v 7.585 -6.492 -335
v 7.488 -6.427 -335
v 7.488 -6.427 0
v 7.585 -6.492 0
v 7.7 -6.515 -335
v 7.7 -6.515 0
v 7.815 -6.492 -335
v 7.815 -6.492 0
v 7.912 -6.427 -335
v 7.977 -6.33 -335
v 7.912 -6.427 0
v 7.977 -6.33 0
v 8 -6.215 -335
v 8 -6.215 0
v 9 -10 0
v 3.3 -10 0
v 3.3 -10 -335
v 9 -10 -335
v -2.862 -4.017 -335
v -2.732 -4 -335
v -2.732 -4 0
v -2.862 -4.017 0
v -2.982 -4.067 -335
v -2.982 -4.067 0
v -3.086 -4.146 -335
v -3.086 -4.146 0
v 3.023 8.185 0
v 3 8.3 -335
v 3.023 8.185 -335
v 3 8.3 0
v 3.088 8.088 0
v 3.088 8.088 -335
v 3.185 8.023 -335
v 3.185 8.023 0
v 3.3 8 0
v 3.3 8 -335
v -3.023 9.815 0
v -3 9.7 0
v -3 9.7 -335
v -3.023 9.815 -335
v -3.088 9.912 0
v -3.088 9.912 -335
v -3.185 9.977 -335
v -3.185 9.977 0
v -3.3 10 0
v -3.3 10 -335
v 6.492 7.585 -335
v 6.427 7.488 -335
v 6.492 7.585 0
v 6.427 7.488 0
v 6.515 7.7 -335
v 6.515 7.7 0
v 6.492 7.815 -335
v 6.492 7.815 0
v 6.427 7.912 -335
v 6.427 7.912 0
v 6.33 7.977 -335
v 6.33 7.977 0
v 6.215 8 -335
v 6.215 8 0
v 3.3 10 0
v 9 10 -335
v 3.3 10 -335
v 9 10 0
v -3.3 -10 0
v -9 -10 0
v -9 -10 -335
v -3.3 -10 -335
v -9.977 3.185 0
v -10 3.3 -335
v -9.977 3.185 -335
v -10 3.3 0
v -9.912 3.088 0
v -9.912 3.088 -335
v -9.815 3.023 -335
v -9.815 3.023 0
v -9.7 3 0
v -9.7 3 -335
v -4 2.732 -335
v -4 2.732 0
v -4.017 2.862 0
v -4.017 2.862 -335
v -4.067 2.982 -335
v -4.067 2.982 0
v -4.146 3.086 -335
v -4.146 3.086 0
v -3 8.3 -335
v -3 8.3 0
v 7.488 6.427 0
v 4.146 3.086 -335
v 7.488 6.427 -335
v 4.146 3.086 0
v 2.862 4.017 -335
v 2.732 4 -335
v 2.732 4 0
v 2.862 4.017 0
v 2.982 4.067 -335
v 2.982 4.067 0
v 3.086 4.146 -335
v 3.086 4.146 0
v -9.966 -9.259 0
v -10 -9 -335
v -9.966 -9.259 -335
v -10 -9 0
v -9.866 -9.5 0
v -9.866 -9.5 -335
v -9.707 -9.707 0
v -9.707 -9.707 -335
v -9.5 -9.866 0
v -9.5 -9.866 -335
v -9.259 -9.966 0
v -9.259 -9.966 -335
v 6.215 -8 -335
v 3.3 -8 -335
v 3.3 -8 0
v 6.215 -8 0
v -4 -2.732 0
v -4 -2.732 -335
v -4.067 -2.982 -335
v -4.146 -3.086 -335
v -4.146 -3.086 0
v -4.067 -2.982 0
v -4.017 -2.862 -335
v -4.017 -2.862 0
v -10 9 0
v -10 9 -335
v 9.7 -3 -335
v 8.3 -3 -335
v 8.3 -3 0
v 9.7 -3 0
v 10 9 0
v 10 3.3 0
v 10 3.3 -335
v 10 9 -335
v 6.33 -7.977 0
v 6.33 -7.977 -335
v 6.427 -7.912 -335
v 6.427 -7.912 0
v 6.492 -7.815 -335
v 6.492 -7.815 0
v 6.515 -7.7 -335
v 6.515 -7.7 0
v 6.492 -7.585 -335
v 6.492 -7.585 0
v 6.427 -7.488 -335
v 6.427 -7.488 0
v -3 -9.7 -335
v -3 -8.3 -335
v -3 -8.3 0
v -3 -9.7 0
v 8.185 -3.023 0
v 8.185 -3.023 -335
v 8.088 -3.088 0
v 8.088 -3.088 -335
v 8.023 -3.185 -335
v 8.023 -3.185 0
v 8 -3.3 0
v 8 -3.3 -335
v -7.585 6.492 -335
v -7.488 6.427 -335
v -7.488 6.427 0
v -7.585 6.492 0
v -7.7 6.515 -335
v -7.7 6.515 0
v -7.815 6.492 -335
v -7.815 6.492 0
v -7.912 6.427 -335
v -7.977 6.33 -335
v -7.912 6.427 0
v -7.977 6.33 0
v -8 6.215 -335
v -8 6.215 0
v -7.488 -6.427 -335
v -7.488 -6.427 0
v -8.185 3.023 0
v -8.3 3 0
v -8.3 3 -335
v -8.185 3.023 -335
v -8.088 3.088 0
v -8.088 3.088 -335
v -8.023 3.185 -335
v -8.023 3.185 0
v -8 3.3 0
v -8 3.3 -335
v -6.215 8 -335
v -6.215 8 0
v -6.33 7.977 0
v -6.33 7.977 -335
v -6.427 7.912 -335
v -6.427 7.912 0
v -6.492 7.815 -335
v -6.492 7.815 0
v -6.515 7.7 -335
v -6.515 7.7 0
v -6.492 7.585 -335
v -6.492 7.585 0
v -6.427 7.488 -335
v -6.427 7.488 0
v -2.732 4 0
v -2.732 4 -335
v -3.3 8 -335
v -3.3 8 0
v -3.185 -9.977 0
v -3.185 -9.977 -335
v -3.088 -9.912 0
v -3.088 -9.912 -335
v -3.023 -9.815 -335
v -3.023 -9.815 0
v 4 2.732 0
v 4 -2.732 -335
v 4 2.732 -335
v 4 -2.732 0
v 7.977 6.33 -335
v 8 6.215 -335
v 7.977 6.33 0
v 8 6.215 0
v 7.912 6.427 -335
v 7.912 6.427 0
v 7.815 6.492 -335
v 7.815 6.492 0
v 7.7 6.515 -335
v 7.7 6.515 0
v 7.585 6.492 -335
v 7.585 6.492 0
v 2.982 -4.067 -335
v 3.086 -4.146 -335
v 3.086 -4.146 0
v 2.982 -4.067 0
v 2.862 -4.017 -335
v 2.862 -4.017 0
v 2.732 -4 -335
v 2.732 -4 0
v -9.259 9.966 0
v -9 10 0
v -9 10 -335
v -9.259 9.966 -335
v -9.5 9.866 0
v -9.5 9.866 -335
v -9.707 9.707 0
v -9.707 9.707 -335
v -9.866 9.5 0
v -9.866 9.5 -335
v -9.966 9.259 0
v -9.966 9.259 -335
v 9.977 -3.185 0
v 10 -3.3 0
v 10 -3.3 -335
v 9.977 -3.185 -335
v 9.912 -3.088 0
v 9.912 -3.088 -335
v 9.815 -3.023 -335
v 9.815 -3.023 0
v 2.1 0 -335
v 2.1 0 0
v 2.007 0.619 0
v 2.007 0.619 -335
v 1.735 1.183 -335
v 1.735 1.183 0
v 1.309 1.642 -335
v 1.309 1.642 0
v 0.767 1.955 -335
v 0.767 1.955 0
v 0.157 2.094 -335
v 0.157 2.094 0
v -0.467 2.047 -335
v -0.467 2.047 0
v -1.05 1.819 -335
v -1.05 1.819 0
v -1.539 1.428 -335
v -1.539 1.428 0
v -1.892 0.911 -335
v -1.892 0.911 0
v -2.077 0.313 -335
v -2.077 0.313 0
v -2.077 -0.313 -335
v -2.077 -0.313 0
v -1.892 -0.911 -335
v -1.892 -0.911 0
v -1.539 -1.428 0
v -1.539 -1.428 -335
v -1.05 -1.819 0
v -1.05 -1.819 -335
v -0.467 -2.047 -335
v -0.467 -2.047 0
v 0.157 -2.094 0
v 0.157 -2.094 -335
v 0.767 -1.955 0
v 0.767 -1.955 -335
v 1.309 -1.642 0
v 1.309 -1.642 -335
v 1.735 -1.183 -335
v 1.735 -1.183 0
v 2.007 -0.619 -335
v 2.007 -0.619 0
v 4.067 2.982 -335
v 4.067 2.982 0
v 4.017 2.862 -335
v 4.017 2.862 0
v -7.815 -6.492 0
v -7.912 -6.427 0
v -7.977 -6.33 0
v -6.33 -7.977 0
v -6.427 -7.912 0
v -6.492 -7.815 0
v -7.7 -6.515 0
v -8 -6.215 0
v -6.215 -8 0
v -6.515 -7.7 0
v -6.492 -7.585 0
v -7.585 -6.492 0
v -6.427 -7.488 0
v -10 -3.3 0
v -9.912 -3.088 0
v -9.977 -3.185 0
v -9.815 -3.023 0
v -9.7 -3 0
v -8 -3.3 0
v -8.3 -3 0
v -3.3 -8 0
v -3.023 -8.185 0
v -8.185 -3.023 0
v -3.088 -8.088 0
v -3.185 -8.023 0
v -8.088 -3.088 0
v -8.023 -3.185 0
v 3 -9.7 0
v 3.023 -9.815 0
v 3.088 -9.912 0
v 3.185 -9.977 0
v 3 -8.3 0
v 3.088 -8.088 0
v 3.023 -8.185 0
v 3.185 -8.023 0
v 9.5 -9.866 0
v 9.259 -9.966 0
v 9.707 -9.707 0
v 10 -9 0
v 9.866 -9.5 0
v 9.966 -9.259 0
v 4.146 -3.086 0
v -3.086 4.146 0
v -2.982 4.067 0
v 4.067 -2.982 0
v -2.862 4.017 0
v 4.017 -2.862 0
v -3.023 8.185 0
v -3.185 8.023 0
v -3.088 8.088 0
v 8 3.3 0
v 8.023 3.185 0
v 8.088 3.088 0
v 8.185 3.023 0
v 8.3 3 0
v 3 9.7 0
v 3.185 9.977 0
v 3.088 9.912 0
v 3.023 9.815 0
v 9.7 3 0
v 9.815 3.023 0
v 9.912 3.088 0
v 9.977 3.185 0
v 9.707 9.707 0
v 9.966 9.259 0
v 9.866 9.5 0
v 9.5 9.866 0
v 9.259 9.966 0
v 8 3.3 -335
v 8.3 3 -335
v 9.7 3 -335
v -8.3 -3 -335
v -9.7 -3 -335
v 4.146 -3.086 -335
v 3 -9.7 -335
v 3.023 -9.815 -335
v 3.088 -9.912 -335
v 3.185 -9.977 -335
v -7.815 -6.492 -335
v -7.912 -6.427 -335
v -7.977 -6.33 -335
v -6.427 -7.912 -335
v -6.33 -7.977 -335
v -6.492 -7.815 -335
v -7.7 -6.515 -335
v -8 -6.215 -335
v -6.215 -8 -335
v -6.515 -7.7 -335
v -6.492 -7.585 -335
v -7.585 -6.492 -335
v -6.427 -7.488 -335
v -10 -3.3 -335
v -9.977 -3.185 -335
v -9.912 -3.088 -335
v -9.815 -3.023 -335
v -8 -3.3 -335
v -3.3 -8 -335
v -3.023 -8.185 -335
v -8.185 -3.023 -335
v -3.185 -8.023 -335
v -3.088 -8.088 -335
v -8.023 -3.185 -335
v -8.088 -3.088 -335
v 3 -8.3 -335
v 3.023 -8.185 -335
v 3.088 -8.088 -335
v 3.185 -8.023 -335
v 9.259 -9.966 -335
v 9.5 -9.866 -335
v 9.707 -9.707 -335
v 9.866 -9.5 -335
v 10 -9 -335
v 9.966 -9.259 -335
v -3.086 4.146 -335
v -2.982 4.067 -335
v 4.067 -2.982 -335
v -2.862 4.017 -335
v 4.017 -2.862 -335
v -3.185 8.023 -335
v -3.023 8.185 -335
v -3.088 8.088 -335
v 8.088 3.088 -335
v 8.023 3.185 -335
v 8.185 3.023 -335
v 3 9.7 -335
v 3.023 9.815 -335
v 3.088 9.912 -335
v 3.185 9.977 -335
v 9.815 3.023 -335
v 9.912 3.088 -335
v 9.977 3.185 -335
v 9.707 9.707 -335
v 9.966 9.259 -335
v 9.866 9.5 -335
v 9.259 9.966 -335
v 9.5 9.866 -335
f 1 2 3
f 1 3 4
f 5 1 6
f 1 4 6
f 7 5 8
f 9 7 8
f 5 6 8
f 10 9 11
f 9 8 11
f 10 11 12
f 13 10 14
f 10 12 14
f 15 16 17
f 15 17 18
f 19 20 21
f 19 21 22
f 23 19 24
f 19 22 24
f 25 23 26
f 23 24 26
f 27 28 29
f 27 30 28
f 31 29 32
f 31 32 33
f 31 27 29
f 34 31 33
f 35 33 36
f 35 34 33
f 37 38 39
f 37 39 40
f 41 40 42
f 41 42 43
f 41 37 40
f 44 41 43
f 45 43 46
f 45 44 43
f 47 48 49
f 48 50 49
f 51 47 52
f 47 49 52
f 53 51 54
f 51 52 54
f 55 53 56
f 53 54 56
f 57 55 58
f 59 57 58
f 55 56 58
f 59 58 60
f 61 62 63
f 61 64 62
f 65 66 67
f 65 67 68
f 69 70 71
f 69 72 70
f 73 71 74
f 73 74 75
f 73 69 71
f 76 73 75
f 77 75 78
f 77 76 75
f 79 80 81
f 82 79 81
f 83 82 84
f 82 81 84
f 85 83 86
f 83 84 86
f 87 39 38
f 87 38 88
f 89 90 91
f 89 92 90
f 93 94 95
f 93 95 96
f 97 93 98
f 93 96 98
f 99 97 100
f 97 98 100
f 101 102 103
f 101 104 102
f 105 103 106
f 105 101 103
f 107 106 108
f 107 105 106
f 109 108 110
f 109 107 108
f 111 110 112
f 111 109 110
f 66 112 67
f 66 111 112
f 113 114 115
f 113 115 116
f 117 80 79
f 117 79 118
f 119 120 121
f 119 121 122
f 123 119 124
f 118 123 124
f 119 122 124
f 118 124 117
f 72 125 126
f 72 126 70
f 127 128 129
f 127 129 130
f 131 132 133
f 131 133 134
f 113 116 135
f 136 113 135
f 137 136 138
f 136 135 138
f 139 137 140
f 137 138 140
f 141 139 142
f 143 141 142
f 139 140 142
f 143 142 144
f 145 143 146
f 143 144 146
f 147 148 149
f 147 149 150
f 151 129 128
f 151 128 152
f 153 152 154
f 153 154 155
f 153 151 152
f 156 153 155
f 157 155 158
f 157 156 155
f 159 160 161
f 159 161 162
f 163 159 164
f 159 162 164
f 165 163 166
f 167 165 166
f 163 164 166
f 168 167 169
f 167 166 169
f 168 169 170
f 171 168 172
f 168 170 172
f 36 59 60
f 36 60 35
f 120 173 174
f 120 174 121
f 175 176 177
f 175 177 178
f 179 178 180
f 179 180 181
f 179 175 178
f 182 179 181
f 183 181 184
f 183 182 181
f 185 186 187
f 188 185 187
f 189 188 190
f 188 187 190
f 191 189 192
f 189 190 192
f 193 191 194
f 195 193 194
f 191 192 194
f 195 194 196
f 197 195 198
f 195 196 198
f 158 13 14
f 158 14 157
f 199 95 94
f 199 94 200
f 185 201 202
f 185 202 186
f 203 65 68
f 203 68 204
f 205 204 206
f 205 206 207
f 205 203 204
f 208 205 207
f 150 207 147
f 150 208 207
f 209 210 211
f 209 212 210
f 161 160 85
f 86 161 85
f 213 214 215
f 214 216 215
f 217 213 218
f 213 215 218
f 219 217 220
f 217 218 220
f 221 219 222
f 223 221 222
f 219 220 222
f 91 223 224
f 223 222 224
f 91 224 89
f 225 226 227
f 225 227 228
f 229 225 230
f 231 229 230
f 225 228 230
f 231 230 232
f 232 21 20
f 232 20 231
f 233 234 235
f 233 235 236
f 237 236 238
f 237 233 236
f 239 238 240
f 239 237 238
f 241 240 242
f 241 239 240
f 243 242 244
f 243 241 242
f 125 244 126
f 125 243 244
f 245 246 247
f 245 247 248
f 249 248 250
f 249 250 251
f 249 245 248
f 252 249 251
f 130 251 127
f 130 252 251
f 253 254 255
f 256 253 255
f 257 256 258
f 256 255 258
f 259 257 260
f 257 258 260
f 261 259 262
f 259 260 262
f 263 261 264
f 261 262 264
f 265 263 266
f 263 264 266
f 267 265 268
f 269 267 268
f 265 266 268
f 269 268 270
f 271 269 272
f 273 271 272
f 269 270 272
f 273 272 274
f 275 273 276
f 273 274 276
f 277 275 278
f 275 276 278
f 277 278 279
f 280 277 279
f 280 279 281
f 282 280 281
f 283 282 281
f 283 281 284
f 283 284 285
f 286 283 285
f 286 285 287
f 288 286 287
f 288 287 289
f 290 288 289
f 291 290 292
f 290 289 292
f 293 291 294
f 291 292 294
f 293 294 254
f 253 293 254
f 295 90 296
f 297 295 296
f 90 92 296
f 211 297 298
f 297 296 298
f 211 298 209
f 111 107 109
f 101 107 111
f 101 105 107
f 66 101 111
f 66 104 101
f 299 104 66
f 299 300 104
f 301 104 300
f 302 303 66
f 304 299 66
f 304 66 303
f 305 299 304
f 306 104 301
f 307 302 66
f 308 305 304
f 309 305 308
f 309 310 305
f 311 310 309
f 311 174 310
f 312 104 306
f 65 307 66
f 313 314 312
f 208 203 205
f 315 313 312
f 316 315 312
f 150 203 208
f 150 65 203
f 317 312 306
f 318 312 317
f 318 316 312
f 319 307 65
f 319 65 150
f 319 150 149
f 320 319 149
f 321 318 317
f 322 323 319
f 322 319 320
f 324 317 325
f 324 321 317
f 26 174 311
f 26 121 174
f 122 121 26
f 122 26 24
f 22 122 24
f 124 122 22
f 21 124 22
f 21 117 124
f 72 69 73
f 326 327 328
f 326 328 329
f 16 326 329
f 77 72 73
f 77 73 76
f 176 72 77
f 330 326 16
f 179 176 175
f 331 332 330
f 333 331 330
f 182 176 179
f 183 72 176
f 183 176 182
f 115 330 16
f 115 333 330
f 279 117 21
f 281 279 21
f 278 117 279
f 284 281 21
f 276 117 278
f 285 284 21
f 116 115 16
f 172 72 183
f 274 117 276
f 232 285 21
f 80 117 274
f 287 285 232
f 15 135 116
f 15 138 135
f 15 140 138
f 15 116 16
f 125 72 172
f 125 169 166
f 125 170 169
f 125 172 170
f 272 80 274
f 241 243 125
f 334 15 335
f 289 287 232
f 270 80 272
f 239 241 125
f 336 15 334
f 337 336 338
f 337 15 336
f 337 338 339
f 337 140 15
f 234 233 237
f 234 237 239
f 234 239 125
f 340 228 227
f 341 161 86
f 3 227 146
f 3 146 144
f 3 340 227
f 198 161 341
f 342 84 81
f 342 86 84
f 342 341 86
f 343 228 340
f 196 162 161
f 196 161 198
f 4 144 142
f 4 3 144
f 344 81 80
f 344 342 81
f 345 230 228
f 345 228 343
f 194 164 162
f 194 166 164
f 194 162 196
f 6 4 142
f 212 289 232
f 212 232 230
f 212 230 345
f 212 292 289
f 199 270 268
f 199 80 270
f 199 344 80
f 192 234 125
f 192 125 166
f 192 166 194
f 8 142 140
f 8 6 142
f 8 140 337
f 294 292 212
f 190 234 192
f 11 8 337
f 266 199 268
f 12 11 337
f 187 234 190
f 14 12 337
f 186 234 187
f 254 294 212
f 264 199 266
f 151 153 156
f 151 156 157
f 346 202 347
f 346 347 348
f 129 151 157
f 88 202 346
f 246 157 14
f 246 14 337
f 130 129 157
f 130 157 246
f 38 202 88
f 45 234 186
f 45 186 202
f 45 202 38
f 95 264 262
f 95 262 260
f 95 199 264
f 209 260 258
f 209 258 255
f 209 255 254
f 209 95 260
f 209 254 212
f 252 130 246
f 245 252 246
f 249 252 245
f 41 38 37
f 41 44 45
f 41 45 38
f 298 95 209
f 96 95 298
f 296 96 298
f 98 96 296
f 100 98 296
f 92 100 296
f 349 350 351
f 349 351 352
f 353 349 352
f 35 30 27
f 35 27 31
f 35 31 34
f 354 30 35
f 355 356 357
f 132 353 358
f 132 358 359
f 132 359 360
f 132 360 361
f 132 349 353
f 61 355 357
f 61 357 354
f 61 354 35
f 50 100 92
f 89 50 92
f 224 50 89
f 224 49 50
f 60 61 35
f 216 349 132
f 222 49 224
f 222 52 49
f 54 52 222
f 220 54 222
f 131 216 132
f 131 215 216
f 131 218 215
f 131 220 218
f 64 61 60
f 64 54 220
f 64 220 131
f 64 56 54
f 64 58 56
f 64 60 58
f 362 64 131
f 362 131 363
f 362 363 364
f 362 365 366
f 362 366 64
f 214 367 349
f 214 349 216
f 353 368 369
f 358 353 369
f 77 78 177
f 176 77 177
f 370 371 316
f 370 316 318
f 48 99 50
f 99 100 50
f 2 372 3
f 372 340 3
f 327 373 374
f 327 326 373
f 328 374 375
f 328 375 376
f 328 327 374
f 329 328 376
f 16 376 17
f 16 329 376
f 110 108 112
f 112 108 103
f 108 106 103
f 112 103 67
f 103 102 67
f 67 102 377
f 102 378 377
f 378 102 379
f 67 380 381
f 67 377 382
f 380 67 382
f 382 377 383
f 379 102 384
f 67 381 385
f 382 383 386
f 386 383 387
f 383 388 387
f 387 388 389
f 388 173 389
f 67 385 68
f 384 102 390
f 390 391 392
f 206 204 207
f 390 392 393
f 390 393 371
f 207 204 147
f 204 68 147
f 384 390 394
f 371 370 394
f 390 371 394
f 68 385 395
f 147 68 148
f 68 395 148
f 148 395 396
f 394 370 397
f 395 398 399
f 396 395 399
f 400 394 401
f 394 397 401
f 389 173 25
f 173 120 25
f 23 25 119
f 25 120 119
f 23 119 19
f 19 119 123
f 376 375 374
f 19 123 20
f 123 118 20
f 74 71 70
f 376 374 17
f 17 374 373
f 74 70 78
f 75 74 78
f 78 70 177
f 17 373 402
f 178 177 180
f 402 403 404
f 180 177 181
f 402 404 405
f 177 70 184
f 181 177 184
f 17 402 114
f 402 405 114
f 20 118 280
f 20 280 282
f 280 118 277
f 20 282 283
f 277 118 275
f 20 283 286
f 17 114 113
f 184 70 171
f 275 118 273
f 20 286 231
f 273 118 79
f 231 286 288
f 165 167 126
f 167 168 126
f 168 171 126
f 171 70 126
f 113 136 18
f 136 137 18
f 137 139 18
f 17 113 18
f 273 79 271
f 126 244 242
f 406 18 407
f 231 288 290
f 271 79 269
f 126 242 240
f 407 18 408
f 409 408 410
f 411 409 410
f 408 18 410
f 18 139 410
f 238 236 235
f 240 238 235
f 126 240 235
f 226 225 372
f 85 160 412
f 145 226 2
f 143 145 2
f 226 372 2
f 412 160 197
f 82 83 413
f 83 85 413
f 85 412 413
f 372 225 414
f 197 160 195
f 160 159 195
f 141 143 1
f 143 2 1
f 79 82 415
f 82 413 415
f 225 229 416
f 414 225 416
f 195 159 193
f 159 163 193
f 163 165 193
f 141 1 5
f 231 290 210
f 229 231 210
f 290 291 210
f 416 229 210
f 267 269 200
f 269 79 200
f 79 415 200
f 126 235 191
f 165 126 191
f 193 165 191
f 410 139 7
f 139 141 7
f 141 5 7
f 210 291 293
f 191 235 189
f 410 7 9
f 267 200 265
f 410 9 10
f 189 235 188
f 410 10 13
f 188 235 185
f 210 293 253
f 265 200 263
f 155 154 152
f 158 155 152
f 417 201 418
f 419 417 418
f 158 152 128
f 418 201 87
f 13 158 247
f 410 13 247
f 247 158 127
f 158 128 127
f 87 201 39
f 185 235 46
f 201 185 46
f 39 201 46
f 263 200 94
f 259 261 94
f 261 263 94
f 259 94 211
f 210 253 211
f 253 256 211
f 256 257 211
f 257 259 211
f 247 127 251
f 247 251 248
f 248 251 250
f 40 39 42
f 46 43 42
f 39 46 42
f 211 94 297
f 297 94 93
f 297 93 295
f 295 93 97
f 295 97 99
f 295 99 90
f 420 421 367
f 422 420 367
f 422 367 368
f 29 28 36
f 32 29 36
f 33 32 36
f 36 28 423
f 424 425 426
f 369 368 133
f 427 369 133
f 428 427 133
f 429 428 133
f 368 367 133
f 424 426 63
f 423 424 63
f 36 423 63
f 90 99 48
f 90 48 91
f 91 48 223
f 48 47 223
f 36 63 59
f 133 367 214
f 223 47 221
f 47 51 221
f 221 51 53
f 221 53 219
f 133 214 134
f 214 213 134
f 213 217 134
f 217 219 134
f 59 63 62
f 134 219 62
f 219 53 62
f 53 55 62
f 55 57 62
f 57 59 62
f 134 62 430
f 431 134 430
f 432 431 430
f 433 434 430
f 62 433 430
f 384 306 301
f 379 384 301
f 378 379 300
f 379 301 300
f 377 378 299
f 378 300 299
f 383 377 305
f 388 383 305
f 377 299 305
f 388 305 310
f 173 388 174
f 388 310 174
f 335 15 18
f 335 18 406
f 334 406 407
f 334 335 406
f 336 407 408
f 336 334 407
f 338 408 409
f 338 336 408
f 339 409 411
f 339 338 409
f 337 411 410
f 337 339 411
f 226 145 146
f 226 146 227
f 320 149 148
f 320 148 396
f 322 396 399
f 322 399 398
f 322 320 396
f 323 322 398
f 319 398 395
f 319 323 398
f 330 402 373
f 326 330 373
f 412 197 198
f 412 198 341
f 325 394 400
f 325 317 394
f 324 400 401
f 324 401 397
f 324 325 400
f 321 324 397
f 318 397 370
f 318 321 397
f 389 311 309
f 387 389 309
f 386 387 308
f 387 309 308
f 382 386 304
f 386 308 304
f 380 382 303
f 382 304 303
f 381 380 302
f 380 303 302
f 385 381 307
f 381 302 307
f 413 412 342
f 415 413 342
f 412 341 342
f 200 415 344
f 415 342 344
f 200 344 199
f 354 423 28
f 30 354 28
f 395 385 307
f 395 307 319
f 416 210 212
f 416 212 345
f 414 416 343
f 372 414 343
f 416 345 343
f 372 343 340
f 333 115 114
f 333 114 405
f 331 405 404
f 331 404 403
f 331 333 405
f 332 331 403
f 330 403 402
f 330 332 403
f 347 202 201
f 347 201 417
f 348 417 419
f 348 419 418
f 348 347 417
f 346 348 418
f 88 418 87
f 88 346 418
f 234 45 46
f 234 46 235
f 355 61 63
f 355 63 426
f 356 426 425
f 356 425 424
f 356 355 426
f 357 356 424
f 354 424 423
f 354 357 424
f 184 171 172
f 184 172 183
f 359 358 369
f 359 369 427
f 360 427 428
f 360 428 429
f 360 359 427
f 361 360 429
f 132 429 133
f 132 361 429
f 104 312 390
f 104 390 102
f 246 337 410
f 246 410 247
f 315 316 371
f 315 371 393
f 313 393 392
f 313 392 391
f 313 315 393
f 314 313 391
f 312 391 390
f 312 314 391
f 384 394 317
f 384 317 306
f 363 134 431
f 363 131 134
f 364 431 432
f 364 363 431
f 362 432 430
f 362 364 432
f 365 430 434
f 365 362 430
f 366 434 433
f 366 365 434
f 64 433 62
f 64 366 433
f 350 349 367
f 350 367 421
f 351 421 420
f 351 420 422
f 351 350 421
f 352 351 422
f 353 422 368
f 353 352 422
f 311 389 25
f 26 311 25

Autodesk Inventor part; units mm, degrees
ref_plane "YZ Plane" through (0, 0, 0) normal (1, 0, 0) x (0, 1, 0)
ref_plane "XZ Plane" through (0, 0, 0) normal (0, 1, 0) x (-1, 0, 0)
ref_plane "XY Plane" through (0, 0, 0) normal (0, 0, 1) x (1, 0, 0)
sketch "Skizze1" plane through (0, 0, 0) normal (0, 0, 1) x (1, 0, 0)
  line L0 (-20.0059, 0) -> (20.0059, 0) projected
  line L1 (0, -20.0059) -> (0, 20.0059) projected
  line L2 (-14.2899, 0) -> (14.2899, 0)
  line L3 (0, -14.2899) -> (0, 14.2899)
  line L4 (-10, -10) -> (10, 10) construction
  line L5 (10, -10) -> (-10, 10) construction
  line L6 (-8, -8) -> (8, 8) construction
  line L7 (8, -8) -> (-8, 8) construction
  line L8 (-2.7322, -4) -> (2.7322, -4)
  line L9 (4, -2.7322) -> (4, 2.7322)
  line L10 (2.7322, 4) -> (-2.7322, 4)
  line L11 (-4, 2.7322) -> (-4, -2.7322)
  line L12 (-4, -4) -> (4, 4) construction
  line L13 (4, -4) -> (-4, 4) construction
  arc A0 (-9, 10) -> (-10, 9) centre (-9, 9) ccw
  arc A1 (10, 9) -> (9, 10) centre (9, 9) ccw
  arc A2 (9, -10) -> (10, -9) centre (9, -9) ccw
  arc A3 (-10, -9) -> (-9, -10) centre (-9, -9) ccw
  line L14 (-3, 9.7) -> (-3, 8.3)
  line L15 (3, 9.7) -> (3, 8.3)
  line L16 (6.2151, 8) -> (3.3, 8)
  line L17 (-3.3, 8) -> (-6.2151, 8)
  line L18 (9, 10) -> (3.3, 10)
  line L19 (-3.3, 10) -> (-9, 10)
  line L20 (-9.7, -3) -> (-8.3, -3)
  line L21 (-9.7, 3) -> (-8.3, 3)
  line L22 (-8, 6.2151) -> (-8, 3.3)
  line L23 (-8, -3.3) -> (-8, -6.2151)
  line L24 (-10, 9) -> (-10, 3.3)
  line L25 (-10, -3.3) -> (-10, -9)
  line L26 (-3, -8.3) -> (-3, -9.7)
  line L27 (3, -8.3) -> (3, -9.7)
  line L28 (-9, -10) -> (-3.3, -10)
  line L29 (3.3, -10) -> (9, -10)
  line L30 (-6.2151, -8) -> (-3.3, -8)
  line L31 (3.3, -8) -> (6.2151, -8)
  line L32 (8.3, 3) -> (9.7, 3)
  line L33 (8.3, -3) -> (9.7, -3)
  line L34 (8, -6.2151) -> (8, -3.3)
  line L35 (8, 3.3) -> (8, 6.2151)
  line L36 (10, -9) -> (10, -3.3)
  line L37 (10, 3.3) -> (10, 9)
  arc A4 (-10, 3.3) -> (-9.7, 3) centre (-9.7, 3.3) ccw
  arc A5 (-8.3, 3) -> (-8, 3.3) centre (-8.3, 3.3) ccw
  arc A6 (-9.7, -3) -> (-10, -3.3) centre (-9.7, -3.3) ccw
  arc A7 (-8, -3.3) -> (-8.3, -3) centre (-8.3, -3.3) ccw
  arc A8 (-3.3, -10) -> (-3, -9.7) centre (-3.3, -9.7) ccw
  arc A9 (-3, -8.3) -> (-3.3, -8) centre (-3.3, -8.3) ccw
  arc A10 (3, -9.7) -> (3.3, -10) centre (3.3, -9.7) ccw
  arc A11 (3.3, -8) -> (3, -8.3) centre (3.3, -8.3) ccw
  arc A12 (8.3, -3) -> (8, -3.3) centre (8.3, -3.3) ccw
  arc A13 (10, -3.3) -> (9.7, -3) centre (9.7, -3.3) ccw
  arc A14 (8, 3.3) -> (8.3, 3) centre (8.3, 3.3) ccw
  arc A15 (9.7, 3) -> (10, 3.3) centre (9.7, 3.3) ccw
  arc A16 (3, 8.3) -> (3.3, 8) centre (3.3, 8.3) ccw
  arc A17 (3.3, 10) -> (3, 9.7) centre (3.3, 9.7) ccw
  arc A18 (-3.3, 8) -> (-3, 8.3) centre (-3.3, 8.3) ccw
  arc A19 (-3, 9.7) -> (-3.3, 10) centre (-3.3, 9.7) ccw
  line L38 (-7.4879, 6.4272) -> (-4.1464, 3.0858)
  line L39 (-6.4272, 7.4879) -> (-3.0858, 4.1464)
  line L40 (-6.4272, -7.4879) -> (-3.0858, -4.1464)
  line L41 (-7.4879, -6.4272) -> (-4.1464, -3.0858)
  arc A20 (-7.4879, 6.4272) -> (-8, 6.2151) centre (-7.7, 6.2151) ccw
  arc A21 (-6.2151, 8) -> (-6.4272, 7.4879) centre (-6.2151, 7.7) ccw
  arc A22 (-8, -6.2151) -> (-7.4879, -6.4272) centre (-7.7, -6.2151) ccw
  arc A23 (-6.4272, -7.4879) -> (-6.2151, -8) centre (-6.2151, -7.7) ccw
  line L42 (6.4272, -7.4879) -> (3.0858, -4.1464)
  line L43 (4.1464, -3.0858) -> (7.4879, -6.4272)
  arc A24 (6.2151, -8) -> (6.4272, -7.4879) centre (6.2151, -7.7) ccw
  arc A25 (7.4879, -6.4272) -> (8, -6.2151) centre (7.7, -6.2151) ccw
  line L44 (4.1464, 3.0858) -> (7.4879, 6.4272)
  line L45 (3.0858, 4.1464) -> (6.4272, 7.4879)
  arc A26 (6.4272, 7.4879) -> (6.2151, 8) centre (6.2151, 7.7) ccw
  arc A27 (8, 6.2151) -> (7.4879, 6.4272) centre (7.7, 6.2151) ccw
  arc A28 (-3.0858, 4.1464) -> (-2.7322, 4) centre (-2.7322, 4.5) ccw
  arc A29 (-4, 2.7322) -> (-4.1464, 3.0858) centre (-4.5, 2.7322) ccw
  arc A30 (2.7322, 4) -> (3.0858, 4.1464) centre (2.7322, 4.5) ccw
  arc A31 (4.1464, 3.0858) -> (4, 2.7322) centre (4.5, 2.7322) ccw
  arc A32 (-4.1464, -3.0858) -> (-4, -2.7322) centre (-4.5, -2.7322) ccw
  arc A33 (-2.7322, -4) -> (-3.0858, -4.1464) centre (-2.7322, -4.5) ccw
  arc A34 (3.0858, -4.1464) -> (2.7322, -4) centre (2.7322, -4.5) ccw
  arc A35 (4, -2.7322) -> (4.1464, -3.0858) centre (4.5, -2.7322) ccw
  circle A36 centre (0, 0) radius 2.1
  point P0 (3, 8.9014)
  point P1 (-3, 9.1415)
  point P2 (-8.9764, -3)
  point P3 (-9.1265, 3)
  point P4 (3, -9.1251)
  point P5 (-3, -9.1251)
  point P6 (9.1101, -3)
  point P7 (9.1101, 3)
  dimension "d0" = 20
  dimension "d1" = 20
  dimension "d2" = 16
  dimension "d3" = 16
  dimension "d4" = 8
  dimension "d5" = 8
  dimension "d6" = 1
  dimension "d7" = 6
  dimension "d8" = 6
  dimension "d9" = 6
  dimension "d10" = 6
  dimension "d11" = 0.3
  dimension "d12" = 1.5
  dimension "d13" = 1.5
  dimension "d14" = 0.3
  dimension "d15" = 1.5
  dimension "d16" = 0.3
  dimension "d17" = 1.5
  dimension "d18" = 0.3
  dimension "d19" = 0.5
  dimension "d20" = 4.2
  dimension "d21" = 45
  dimension "d22" = 10
  dimension "d23" = 10
  dimension "d24" = 4
  dimension "d25" = 4
  dimension "d26" = 10
  dimension "d27" = 8
  dimension "d28" = 4
  dimension "d29" = 4
  dimension "d30" = 10
  dimension "d31" = 9.1101
  dimension "d32" = 8
  dimension "d33" = 4
  dimension "d34" = 8.9014
  dimension "d35" = 9.1251
  dimension "d36" = 9.1415
  dimension "d37" = 8.9764
  dimension "d38" = 9.1265
extrude "Extrusion1" add sketch "Skizze1" against normal blind 335
sketch "Skizze2" plane through (0, 0, 0) normal (0, 0, 1) x (1, 0, 0)
  arc A0 (-4.1464, -3.0858) -> (-4, -2.7322) centre (-4.5, -2.7322) ccw projected
  line L0 (-4.1464, -3.0858) -> (-7.4879, -6.4272) projected
  arc A1 (-8, -6.2151) -> (-7.4879, -6.4272) centre (-7.7, -6.2151) ccw projected
  line L1 (-8, -6.2151) -> (-8, -3.3) projected
  arc A2 (-8, -3.3) -> (-8.3, -3) centre (-8.3, -3.3) ccw projected
  line L2 (-8.3, -3) -> (-9.7, -3) projected
  arc A3 (-9.7, -3) -> (-10, -3.3) centre (-9.7, -3.3) ccw projected
  line L3 (-10, -3.3) -> (-10, -9) projected
  arc A4 (-10, -9) -> (-9, -10) centre (-9, -9) ccw projected
  line L4 (-9, -10) -> (-3.3, -10) projected
  arc A5 (-3.3, -10) -> (-3, -9.7) centre (-3.3, -9.7) ccw projected
  line L5 (-3, -9.7) -> (-3, -8.3) projected
  arc A6 (-3, -8.3) -> (-3.3, -8) centre (-3.3, -8.3) ccw projected
  line L6 (-3.3, -8) -> (-6.2151, -8) projected
  arc A7 (-6.4272, -7.4879) -> (-6.2151, -8) centre (-6.2151, -7.7) ccw projected
  line L7 (-6.4272, -7.4879) -> (-3.0858, -4.1464) projected
  arc A8 (-2.7322, -4) -> (-3.0858, -4.1464) centre (-2.7322, -4.5) ccw projected
  line L8 (-2.7322, -4) -> (2.7322, -4) projected
  arc A9 (3.0858, -4.1464) -> (2.7322, -4) centre (2.7322, -4.5) ccw projected
  line L9 (3.0858, -4.1464) -> (6.4272, -7.4879) projected
  arc A10 (6.2151, -8) -> (6.4272, -7.4879) centre (6.2151, -7.7) ccw projected
  line L10 (6.2151, -8) -> (3.3, -8) projected
  arc A11 (3.3, -8) -> (3, -8.3) centre (3.3, -8.3) ccw projected
  line L11 (3, -8.3) -> (3, -9.7) projected
  arc A12 (3, -9.7) -> (3.3, -10) centre (3.3, -9.7) ccw projected
  line L12 (3.3, -10) -> (9, -10) projected
  arc A13 (9, -10) -> (10, -9) centre (9, -9) ccw projected
  line L13 (10, -9) -> (10, -3.3) projected
  arc A14 (10, -3.3) -> (9.7, -3) centre (9.7, -3.3) ccw projected
  line L14 (9.7, -3) -> (8.3, -3) projected
  arc A15 (8.3, -3) -> (8, -3.3) centre (8.3, -3.3) ccw projected
  line L15 (8, -3.3) -> (8, -6.2151) projected
  arc A16 (7.4879, -6.4272) -> (8, -6.2151) centre (7.7, -6.2151) ccw projected
  line L16 (7.4879, -6.4272) -> (4.1464, -3.0858) projected
  arc A17 (4, -2.7322) -> (4.1464, -3.0858) centre (4.5, -2.7322) ccw projected
  line L17 (4, -2.7322) -> (4, 2.7322) projected
  arc A18 (4.1464, 3.0858) -> (4, 2.7322) centre (4.5, 2.7322) ccw projected
  line L18 (4.1464, 3.0858) -> (7.4879, 6.4272) projected
  arc A19 (8, 6.2151) -> (7.4879, 6.4272) centre (7.7, 6.2151) ccw projected
  line L19 (8, 6.2151) -> (8, 3.3) projected
  arc A20 (8, 3.3) -> (8.3, 3) centre (8.3, 3.3) ccw projected
  line L20 (8.3, 3) -> (9.7, 3) projected
  arc A21 (9.7, 3) -> (10, 3.3) centre (9.7, 3.3) ccw projected
  line L21 (10, 3.3) -> (10, 9) projected
  arc A22 (10, 9) -> (9, 10) centre (9, 9) ccw projected
  line L22 (9, 10) -> (3.3, 10) projected
  arc A23 (3.3, 10) -> (3, 9.7) centre (3.3, 9.7) ccw projected
  line L23 (3, 9.7) -> (3, 8.3) projected
  arc A24 (3, 8.3) -> (3.3, 8) centre (3.3, 8.3) ccw projected
  line L24 (3.3, 8) -> (6.2151, 8) projected
  arc A25 (6.4272, 7.4879) -> (6.2151, 8) centre (6.2151, 7.7) ccw projected
  line L25 (6.4272, 7.4879) -> (3.0858, 4.1464) projected
  arc A26 (2.7322, 4) -> (3.0858, 4.1464) centre (2.7322, 4.5) ccw projected
  line L26 (2.7322, 4) -> (-2.7322, 4) projected
  arc A27 (-3.0858, 4.1464) -> (-2.7322, 4) centre (-2.7322, 4.5) ccw projected
  line L27 (-3.0858, 4.1464) -> (-6.4272, 7.4879) projected
  arc A28 (-6.2151, 8) -> (-6.4272, 7.4879) centre (-6.2151, 7.7) ccw projected
  line L28 (-6.2151, 8) -> (-3.3, 8) projected
  arc A29 (-3.3, 8) -> (-3, 8.3) centre (-3.3, 8.3) ccw projected
  line L29 (-3, 8.3) -> (-3, 9.7) projected
  arc A30 (-3, 9.7) -> (-3.3, 10) centre (-3.3, 9.7) ccw projected
  line L30 (-3.3, 10) -> (-9, 10) projected
  arc A31 (-9, 10) -> (-10, 9) centre (-9, 9) ccw projected
  line L31 (-10, 9) -> (-10, 3.3) projected
  arc A32 (-10, 3.3) -> (-9.7, 3) centre (-9.7, 3.3) ccw projected
  line L32 (-9.7, 3) -> (-8.3, 3) projected
  arc A33 (-8.3, 3) -> (-8, 3.3) centre (-8.3, 3.3) ccw projected
  line L33 (-8, 3.3) -> (-8, 6.2151) projected
  arc A34 (-7.4879, 6.4272) -> (-8, 6.2151) centre (-7.7, 6.2151) ccw projected
  line L34 (-7.4879, 6.4272) -> (-4.1464, 3.0858) projected
  arc A35 (-4, 2.7322) -> (-4.1464, 3.0858) centre (-4.5, 2.7322) ccw projected
  line L35 (-4, 2.7322) -> (-4, -2.7322) projected
  line L36 (-14.2899, 0) -> (14.2899, 0) projected
  line L37 (0, -14.2899) -> (0, 14.2899) projected
  circle A36 centre (0, 0) radius 2.1
  dimension "d41" = 4.2
extrude "Extrusion2" cut sketch "Skizze2" against normal blind 335 contours A36 L37 L36 | L36 L37 A36 | L37 A36 L36 | L36 A36 L37
properties part number "I Strebe waagrecht" material "Aluminium 6061"
